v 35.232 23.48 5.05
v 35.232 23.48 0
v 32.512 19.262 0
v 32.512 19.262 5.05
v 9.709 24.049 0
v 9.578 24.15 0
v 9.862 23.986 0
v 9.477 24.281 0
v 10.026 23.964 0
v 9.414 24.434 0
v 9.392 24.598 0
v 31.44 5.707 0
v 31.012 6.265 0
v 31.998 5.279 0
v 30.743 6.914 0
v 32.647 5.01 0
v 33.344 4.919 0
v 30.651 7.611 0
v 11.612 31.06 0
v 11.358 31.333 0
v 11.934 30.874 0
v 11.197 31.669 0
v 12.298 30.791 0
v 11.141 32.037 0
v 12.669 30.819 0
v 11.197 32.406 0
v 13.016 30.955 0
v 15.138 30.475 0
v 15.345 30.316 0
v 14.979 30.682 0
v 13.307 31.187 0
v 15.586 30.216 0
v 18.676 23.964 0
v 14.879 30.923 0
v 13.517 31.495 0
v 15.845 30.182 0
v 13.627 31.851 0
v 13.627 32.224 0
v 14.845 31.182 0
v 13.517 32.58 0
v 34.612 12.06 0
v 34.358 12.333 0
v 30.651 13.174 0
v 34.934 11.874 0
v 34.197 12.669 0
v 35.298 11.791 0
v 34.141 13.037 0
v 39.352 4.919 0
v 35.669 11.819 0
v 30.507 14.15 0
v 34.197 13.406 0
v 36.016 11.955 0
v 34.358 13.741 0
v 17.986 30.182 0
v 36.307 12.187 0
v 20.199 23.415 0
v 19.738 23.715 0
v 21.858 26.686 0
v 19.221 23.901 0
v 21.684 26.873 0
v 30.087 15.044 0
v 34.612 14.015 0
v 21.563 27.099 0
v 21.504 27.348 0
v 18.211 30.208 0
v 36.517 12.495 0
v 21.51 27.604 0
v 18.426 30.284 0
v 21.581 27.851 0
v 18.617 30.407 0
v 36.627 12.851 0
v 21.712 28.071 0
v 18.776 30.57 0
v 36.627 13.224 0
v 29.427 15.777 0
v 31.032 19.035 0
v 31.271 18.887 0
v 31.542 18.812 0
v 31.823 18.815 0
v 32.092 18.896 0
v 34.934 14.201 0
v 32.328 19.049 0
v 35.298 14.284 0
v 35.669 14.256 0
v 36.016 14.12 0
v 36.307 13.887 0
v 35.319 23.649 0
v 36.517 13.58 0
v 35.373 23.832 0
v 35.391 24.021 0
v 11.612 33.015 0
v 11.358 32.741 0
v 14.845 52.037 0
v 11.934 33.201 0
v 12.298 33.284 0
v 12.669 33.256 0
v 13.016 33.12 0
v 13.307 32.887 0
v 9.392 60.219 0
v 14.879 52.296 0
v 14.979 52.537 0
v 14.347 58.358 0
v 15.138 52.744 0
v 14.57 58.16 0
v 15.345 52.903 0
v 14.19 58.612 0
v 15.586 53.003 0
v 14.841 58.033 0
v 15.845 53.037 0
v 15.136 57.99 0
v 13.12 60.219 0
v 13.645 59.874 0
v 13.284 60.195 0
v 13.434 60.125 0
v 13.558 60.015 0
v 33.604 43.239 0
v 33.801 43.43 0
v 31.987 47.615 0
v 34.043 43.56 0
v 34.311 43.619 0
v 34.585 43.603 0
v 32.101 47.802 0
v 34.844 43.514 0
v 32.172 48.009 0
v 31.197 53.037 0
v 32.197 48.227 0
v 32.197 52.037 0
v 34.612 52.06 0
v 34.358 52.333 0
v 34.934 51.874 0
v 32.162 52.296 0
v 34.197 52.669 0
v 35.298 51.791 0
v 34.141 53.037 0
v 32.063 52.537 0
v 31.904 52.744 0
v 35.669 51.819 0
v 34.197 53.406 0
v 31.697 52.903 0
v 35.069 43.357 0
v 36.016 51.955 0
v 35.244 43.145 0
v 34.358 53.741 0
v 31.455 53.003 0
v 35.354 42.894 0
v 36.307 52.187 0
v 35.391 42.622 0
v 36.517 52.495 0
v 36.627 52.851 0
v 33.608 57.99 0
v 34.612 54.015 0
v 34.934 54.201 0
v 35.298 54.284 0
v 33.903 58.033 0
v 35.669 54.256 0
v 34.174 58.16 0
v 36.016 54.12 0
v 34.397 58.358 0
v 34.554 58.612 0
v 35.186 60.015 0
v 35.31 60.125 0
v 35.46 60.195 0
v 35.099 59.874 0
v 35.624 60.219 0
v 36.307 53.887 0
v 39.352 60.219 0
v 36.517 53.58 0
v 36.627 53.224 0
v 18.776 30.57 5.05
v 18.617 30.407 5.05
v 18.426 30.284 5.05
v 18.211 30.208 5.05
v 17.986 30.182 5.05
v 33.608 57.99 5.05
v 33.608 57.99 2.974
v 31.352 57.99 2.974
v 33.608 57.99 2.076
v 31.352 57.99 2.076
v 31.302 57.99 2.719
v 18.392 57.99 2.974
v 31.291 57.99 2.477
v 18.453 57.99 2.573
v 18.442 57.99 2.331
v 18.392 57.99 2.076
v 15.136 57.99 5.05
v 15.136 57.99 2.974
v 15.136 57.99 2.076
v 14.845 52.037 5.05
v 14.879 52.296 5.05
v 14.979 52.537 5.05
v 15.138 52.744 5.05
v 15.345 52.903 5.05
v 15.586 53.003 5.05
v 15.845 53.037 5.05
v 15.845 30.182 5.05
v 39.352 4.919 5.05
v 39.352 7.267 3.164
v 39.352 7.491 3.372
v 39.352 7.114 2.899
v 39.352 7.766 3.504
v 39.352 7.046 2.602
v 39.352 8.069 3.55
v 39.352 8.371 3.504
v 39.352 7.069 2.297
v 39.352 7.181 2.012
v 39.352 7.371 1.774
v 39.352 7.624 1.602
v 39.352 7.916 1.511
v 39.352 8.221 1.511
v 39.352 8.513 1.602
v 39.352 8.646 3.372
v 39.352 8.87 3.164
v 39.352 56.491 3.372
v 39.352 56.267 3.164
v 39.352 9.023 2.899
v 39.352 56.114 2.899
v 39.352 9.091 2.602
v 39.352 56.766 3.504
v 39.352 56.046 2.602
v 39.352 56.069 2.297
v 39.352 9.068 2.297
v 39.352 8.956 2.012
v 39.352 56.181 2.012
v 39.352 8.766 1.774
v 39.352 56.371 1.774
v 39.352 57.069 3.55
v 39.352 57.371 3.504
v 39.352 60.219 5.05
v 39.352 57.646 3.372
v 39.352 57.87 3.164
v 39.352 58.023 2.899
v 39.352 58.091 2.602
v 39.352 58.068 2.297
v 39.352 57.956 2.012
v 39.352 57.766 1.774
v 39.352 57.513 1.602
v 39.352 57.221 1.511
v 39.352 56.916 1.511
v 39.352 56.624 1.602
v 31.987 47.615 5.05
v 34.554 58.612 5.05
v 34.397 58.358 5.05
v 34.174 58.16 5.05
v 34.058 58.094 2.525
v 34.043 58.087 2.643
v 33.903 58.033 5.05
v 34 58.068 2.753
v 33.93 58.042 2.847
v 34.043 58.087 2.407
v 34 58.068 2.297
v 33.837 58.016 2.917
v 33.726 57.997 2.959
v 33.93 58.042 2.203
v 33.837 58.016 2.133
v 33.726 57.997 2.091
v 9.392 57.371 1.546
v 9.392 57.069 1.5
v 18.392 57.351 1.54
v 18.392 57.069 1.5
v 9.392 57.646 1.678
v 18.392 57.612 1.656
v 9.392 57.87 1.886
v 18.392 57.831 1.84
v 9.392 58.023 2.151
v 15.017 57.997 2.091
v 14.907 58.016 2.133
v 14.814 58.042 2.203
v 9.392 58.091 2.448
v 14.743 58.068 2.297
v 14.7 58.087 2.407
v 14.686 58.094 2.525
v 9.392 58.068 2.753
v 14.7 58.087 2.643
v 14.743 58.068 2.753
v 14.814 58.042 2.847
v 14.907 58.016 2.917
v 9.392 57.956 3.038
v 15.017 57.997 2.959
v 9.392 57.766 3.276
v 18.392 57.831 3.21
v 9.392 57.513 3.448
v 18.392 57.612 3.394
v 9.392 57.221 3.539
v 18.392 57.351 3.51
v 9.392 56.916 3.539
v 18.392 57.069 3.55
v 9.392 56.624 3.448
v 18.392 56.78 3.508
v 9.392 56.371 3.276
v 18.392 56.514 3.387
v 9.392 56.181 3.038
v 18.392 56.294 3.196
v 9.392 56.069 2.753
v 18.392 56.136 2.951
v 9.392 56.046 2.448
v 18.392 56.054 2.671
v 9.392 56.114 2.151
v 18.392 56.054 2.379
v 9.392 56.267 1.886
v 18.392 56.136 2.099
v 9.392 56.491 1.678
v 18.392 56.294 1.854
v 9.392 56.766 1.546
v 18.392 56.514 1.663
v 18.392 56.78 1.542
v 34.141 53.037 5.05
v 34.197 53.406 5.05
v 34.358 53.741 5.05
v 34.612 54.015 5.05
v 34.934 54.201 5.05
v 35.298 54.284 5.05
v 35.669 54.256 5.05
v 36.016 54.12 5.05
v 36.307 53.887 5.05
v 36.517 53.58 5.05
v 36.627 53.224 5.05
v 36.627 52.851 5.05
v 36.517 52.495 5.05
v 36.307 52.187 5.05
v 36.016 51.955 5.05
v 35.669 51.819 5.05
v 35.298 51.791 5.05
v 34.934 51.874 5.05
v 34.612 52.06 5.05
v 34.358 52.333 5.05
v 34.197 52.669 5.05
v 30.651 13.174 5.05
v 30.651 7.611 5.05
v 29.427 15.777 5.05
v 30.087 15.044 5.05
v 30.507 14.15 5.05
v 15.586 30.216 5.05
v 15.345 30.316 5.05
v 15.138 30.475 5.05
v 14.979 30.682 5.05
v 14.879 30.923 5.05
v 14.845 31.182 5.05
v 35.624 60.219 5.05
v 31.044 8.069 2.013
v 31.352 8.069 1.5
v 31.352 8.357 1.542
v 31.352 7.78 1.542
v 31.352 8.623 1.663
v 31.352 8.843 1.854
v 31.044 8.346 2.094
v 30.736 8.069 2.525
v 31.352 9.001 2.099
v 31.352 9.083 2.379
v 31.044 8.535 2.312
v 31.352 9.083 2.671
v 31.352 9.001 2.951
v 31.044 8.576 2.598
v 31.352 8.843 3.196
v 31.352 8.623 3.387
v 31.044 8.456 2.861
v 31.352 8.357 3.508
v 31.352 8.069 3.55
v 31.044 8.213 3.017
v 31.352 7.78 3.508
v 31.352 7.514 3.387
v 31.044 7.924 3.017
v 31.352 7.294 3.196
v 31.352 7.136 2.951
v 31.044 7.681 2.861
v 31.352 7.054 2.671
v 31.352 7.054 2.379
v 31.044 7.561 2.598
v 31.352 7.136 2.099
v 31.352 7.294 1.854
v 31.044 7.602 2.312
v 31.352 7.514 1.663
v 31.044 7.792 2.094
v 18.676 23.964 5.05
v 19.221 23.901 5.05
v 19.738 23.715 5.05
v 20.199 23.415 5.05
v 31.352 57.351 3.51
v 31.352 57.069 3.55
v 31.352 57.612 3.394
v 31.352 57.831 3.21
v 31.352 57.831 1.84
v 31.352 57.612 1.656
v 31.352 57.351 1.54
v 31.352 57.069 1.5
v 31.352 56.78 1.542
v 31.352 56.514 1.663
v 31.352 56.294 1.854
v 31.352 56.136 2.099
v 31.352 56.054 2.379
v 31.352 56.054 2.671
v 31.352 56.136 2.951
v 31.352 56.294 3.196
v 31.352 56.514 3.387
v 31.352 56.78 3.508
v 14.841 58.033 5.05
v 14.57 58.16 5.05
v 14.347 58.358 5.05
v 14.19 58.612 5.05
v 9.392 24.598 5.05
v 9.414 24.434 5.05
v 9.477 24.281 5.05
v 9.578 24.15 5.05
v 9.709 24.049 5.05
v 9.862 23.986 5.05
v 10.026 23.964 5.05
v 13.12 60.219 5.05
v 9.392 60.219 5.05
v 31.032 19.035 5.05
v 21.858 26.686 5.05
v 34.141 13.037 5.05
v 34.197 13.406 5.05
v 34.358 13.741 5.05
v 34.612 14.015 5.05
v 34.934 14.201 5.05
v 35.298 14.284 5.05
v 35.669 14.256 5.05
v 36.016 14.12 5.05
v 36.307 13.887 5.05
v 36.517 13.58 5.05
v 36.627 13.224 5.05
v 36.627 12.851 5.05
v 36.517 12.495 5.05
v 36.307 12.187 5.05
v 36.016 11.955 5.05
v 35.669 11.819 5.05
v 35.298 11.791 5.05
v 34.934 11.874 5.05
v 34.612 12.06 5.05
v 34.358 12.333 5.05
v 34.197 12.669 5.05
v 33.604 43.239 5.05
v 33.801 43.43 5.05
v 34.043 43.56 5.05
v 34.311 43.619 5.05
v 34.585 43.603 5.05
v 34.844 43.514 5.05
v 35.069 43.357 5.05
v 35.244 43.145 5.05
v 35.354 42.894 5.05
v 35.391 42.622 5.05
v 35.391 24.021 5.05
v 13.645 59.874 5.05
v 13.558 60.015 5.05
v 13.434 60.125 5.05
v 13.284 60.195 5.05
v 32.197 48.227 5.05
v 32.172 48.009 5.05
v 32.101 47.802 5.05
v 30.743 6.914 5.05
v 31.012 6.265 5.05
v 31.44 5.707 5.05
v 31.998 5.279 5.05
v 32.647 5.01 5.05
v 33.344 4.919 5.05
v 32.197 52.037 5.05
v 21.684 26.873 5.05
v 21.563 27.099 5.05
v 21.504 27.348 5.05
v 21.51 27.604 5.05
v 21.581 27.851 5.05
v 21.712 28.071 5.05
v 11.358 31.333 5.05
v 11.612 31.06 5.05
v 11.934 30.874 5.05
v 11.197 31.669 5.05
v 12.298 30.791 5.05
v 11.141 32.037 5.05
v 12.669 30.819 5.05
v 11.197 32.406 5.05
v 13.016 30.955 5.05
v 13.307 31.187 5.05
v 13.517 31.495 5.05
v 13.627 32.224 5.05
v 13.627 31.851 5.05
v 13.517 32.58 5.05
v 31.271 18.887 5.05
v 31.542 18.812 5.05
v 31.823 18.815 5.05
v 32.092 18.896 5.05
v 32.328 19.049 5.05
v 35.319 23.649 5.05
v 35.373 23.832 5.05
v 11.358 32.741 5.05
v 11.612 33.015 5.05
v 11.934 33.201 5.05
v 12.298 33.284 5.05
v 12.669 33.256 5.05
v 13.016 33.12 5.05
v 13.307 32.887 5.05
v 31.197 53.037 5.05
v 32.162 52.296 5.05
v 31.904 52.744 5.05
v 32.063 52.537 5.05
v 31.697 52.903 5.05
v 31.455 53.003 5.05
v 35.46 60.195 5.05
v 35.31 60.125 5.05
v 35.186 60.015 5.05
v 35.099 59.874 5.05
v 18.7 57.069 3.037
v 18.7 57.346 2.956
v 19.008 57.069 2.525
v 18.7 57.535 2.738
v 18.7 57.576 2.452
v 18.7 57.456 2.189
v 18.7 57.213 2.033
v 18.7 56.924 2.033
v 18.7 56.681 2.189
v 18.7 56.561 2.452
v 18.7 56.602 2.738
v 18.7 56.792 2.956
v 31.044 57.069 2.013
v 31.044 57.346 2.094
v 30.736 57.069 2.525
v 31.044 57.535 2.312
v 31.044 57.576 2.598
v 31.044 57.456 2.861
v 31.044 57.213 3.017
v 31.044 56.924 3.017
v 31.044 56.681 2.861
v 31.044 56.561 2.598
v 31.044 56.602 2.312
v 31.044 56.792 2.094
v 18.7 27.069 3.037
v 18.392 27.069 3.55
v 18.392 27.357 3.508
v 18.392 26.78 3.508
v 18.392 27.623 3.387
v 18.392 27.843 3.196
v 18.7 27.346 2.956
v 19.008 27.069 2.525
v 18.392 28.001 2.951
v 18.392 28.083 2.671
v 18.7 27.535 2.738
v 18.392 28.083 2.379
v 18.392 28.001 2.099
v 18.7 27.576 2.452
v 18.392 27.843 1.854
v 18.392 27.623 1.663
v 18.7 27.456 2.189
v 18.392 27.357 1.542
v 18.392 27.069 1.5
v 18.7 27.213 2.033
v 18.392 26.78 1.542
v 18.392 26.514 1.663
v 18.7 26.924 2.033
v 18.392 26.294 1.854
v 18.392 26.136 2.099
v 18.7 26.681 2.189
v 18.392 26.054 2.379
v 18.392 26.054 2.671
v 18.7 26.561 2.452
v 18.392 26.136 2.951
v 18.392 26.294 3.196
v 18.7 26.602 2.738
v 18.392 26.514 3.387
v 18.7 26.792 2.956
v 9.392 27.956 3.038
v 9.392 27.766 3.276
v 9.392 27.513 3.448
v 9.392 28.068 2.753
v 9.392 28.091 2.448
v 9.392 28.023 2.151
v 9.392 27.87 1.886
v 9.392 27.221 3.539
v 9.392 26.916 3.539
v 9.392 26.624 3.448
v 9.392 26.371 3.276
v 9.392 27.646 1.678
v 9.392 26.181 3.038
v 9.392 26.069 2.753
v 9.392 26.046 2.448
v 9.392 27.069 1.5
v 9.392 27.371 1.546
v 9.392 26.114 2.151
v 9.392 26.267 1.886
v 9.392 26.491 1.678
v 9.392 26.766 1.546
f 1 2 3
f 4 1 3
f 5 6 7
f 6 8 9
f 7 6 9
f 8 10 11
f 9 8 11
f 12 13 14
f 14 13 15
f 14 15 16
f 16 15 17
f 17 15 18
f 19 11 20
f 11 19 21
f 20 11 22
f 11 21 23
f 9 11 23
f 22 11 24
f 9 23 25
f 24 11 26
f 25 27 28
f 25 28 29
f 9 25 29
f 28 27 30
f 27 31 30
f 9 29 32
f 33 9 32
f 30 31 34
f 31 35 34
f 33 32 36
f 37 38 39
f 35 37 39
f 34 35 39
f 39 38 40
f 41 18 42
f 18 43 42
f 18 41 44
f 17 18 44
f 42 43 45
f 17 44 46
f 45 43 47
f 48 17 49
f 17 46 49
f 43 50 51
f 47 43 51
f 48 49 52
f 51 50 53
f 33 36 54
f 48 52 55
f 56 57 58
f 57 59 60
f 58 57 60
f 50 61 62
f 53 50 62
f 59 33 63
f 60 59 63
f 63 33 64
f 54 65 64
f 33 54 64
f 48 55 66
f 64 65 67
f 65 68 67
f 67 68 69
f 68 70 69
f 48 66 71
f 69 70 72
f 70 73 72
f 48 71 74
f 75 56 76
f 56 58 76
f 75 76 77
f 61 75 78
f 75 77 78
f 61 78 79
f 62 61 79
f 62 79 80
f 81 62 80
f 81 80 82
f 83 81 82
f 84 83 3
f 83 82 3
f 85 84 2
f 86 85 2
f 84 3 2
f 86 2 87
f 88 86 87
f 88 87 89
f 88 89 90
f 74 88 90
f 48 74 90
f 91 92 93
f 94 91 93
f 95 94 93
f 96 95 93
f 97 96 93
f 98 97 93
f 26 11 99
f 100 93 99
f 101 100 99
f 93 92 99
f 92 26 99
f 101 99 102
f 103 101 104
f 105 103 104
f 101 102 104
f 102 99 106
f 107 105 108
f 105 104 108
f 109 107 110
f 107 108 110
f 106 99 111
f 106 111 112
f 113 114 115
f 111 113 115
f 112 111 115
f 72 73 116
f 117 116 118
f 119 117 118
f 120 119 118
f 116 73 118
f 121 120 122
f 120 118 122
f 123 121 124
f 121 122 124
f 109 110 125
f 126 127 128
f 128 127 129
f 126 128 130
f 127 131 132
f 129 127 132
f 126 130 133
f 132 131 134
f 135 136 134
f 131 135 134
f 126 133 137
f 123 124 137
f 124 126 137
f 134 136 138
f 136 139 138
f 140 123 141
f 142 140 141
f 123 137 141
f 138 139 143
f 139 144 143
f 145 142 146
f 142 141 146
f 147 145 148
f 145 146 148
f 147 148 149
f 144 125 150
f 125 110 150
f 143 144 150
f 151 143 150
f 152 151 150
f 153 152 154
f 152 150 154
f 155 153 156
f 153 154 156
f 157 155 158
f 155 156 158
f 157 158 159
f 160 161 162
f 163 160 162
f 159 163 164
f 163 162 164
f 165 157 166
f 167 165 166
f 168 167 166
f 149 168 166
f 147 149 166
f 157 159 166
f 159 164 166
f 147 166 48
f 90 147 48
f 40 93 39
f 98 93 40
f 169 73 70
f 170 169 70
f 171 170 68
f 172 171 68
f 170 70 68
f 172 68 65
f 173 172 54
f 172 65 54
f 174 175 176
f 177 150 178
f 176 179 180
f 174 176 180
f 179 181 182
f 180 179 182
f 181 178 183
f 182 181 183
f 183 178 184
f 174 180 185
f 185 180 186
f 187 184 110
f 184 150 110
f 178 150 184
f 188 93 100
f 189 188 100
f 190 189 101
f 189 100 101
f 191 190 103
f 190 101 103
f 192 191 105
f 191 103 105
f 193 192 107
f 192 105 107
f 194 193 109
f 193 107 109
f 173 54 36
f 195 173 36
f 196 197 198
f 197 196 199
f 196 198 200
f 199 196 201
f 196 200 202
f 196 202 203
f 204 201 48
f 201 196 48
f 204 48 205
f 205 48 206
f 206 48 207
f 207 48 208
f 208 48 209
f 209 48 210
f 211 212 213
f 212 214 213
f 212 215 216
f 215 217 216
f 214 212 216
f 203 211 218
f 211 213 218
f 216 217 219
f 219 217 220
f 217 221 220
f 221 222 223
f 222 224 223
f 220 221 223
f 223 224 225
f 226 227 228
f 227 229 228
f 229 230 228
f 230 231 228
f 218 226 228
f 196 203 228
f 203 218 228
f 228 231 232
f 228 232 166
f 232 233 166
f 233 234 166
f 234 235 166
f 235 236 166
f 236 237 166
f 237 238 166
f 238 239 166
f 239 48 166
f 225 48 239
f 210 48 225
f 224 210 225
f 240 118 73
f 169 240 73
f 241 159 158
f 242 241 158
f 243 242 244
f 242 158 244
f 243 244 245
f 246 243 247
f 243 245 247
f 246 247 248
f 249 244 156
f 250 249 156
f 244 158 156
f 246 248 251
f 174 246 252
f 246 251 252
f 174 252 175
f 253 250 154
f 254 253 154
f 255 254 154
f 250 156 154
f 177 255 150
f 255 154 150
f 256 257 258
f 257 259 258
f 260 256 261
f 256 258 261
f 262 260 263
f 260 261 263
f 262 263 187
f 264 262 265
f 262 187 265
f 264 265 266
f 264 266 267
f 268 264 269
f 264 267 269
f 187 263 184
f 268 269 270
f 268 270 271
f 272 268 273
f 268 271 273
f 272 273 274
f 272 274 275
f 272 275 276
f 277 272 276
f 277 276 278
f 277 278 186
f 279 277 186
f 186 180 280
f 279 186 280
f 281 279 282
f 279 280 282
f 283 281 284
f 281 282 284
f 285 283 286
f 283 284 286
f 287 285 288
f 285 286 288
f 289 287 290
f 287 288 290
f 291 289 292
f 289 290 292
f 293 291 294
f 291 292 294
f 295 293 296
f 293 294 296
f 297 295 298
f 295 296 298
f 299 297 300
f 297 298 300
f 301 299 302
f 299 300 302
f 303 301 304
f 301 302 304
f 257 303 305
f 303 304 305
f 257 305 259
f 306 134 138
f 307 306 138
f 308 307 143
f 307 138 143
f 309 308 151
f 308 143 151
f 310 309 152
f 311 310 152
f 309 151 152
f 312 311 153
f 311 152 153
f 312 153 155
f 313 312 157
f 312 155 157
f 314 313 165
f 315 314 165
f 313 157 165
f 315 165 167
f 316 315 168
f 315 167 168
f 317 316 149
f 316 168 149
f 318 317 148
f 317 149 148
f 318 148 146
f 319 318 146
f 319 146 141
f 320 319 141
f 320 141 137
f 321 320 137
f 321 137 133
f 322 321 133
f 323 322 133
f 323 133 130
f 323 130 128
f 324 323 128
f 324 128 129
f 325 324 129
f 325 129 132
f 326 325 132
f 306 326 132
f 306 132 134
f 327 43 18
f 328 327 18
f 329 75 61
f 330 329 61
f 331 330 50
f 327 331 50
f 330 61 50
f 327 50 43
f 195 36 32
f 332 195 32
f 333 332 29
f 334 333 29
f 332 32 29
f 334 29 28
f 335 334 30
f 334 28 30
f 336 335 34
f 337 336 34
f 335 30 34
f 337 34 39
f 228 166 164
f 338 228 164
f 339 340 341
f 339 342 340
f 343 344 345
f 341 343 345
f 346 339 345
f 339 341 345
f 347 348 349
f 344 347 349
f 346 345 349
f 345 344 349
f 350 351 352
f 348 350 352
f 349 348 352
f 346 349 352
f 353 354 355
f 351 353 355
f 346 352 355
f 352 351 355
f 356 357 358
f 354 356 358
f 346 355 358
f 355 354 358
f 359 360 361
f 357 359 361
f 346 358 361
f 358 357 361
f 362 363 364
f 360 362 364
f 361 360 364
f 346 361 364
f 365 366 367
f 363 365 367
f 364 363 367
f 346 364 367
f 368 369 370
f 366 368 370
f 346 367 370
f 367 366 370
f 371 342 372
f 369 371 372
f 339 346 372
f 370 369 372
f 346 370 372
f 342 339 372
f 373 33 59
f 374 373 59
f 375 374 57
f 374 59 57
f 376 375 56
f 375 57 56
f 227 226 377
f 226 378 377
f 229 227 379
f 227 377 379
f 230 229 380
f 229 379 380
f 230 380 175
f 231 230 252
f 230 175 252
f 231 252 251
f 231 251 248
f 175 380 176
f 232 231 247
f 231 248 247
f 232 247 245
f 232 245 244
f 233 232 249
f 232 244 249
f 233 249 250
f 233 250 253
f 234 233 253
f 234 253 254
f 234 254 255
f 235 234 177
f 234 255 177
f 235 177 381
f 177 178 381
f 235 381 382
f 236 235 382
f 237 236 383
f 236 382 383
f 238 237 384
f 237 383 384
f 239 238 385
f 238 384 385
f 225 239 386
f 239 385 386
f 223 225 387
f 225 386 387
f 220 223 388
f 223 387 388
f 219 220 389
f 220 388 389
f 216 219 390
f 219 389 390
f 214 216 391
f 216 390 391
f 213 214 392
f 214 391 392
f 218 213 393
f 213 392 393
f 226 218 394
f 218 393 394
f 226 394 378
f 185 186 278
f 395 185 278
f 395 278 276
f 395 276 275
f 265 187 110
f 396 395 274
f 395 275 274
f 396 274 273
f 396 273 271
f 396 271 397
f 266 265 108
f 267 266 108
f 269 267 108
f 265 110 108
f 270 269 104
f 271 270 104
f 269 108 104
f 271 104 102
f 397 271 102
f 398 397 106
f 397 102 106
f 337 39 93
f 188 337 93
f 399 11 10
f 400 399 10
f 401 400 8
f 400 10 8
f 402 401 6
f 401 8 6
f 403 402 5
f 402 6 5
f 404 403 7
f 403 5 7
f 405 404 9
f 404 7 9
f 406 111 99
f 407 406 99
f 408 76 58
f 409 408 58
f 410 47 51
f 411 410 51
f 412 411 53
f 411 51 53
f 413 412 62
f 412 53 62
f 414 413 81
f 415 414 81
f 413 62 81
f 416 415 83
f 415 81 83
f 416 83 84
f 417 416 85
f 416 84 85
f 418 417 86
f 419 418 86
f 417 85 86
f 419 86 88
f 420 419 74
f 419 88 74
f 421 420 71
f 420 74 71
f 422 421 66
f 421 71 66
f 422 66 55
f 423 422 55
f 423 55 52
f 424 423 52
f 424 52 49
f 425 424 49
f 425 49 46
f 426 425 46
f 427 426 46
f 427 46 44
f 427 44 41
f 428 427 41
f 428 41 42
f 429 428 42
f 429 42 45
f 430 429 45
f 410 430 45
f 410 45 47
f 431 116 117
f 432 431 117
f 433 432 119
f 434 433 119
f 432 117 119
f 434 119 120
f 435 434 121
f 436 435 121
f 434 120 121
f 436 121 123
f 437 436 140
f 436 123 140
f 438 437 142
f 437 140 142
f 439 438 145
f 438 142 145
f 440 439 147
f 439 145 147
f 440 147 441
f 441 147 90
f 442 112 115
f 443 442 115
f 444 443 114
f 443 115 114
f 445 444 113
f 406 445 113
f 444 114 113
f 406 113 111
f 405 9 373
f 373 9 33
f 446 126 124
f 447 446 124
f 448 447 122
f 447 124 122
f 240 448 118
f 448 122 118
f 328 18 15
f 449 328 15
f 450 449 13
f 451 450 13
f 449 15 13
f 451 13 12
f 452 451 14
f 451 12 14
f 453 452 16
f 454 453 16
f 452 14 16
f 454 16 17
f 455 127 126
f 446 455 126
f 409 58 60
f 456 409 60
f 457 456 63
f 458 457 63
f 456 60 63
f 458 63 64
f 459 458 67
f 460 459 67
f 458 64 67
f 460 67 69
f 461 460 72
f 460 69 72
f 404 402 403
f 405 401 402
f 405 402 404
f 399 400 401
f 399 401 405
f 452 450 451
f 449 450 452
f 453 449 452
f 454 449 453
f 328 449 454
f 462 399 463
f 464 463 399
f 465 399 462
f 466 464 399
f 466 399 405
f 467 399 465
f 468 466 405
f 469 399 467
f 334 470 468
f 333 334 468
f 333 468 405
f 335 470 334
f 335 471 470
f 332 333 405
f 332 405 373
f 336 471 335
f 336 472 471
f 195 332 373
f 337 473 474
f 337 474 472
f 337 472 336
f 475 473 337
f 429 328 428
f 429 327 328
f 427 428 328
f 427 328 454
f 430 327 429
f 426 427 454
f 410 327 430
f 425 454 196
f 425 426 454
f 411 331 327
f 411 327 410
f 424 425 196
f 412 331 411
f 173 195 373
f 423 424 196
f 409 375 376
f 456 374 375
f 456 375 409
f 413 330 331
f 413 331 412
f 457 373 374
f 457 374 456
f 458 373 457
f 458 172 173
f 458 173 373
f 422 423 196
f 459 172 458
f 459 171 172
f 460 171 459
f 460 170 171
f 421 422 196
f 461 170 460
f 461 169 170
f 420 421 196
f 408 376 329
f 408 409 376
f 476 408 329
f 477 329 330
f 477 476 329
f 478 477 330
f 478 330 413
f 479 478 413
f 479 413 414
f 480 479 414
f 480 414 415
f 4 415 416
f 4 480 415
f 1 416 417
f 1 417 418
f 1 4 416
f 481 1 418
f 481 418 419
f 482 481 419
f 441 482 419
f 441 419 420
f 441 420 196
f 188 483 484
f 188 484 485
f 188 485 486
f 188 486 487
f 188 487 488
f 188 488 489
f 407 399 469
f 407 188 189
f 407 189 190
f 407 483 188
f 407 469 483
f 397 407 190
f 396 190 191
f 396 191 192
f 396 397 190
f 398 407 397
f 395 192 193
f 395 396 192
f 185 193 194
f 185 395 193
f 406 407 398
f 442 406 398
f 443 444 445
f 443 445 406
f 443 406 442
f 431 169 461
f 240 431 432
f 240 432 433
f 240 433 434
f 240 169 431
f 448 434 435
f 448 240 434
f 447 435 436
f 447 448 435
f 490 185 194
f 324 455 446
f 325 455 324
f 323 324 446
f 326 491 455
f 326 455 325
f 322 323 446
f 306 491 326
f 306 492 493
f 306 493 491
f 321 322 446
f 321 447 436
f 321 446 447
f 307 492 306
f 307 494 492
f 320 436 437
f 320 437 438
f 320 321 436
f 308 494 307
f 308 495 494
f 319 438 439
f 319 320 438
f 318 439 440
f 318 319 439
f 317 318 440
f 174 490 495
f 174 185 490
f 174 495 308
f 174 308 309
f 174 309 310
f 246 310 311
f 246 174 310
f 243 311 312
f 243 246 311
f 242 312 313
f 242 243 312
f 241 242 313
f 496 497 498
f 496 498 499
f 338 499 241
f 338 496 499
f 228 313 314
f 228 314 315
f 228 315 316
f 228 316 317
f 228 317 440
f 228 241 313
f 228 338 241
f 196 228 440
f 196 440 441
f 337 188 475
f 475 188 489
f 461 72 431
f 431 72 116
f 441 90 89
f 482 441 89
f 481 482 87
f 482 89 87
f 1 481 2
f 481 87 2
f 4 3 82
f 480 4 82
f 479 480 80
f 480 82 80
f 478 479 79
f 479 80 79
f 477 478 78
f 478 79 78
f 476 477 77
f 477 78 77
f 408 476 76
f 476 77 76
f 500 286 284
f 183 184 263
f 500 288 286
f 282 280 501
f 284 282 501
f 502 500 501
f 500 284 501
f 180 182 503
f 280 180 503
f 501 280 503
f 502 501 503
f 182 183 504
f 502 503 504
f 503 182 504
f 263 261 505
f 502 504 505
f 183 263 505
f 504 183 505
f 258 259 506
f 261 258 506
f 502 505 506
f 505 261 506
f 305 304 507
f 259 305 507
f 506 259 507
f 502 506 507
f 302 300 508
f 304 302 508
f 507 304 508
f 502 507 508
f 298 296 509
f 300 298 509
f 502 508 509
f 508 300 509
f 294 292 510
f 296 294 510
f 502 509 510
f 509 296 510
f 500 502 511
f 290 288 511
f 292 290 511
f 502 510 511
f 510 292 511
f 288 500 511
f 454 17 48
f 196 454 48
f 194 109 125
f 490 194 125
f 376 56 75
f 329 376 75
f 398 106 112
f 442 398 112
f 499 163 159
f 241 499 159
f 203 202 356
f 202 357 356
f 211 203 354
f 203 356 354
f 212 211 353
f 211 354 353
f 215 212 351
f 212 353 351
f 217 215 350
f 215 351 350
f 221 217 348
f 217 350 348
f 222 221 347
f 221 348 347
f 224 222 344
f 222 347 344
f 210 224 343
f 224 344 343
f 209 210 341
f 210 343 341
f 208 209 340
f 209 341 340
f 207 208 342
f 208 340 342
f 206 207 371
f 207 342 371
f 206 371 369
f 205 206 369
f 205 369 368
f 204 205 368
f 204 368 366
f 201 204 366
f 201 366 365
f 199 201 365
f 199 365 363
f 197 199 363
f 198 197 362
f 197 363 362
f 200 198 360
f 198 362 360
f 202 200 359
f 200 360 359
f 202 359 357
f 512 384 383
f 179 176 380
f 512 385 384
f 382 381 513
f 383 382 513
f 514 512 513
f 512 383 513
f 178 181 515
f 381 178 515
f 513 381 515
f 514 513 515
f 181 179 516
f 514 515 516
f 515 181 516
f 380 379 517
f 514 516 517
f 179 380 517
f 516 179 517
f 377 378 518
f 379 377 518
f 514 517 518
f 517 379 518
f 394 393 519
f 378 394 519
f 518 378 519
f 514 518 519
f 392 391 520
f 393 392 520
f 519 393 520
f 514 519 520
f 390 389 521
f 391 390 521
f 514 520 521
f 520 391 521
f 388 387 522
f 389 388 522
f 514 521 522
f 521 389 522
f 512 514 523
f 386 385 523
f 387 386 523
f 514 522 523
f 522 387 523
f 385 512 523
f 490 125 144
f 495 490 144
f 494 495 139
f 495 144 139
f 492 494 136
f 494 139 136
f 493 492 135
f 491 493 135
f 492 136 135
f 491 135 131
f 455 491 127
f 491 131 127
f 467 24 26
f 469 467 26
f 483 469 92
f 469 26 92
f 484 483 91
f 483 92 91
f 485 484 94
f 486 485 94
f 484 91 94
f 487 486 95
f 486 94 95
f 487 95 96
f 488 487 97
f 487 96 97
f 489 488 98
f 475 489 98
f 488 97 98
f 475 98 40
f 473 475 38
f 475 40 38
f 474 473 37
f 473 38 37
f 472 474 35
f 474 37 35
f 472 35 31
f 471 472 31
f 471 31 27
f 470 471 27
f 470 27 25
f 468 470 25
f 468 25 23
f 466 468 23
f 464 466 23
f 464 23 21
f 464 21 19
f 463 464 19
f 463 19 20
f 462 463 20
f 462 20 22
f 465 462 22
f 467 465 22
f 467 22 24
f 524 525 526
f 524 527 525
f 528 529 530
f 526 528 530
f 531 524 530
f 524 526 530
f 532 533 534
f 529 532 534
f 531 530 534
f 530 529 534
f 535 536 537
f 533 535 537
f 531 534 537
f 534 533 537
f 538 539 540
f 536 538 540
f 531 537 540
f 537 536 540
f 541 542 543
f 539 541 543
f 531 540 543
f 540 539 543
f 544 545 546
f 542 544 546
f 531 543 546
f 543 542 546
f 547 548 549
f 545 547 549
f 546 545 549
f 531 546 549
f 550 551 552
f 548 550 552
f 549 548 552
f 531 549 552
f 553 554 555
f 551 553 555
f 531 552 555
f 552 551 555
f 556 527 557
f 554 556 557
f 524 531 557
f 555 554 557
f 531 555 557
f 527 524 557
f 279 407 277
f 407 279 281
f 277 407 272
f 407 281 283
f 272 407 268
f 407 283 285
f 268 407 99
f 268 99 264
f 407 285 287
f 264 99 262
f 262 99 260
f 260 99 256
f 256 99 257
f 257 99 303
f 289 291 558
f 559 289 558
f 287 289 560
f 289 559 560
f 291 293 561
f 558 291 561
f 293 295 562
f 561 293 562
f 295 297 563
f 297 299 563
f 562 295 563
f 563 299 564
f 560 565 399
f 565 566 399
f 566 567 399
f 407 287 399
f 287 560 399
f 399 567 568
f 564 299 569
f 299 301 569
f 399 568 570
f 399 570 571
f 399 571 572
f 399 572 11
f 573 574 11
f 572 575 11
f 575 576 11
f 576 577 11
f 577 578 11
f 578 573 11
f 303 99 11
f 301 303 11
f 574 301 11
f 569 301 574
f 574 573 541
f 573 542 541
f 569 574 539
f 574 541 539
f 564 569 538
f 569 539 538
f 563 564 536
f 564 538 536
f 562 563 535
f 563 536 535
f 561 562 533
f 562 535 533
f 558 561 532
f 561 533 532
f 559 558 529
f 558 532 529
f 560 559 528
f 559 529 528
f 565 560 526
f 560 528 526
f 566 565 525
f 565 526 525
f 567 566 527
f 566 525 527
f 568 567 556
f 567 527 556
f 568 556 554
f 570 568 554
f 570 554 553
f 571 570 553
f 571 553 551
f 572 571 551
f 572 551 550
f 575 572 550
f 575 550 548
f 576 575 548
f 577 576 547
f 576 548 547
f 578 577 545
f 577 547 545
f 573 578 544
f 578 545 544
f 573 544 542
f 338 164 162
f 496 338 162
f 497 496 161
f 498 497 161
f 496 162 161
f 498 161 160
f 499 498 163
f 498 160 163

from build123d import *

# Parameters (mm, degrees)
ESTRUSIONE_ESTRUSIONE1_DEPTH     = 5.05
FORO_FILETTATO_M3X0_5_1_D        = 2.5
FORO_FILETTATO_M2_5X0_45_1_D     = 2.05
FORO_FILETTATO_M2_5X0_45_1_DEPTH = 8
FORO_FILETTATO_M2_5X0_45_1_TIP   = 0.615882135
FORO_FILETTATO_M2_5X0_45_2_D     = 2.05
FORO_FILETTATO_M2_5X0_45_2_DEPTH = 9
FORO_FILETTATO_M2_5X0_45_2_TIP   = 0.615882135


with BuildPart() as part:
    # Schizzo1 → Estrusione-Estrusione1 (new body)
    with BuildSketch(Plane.XY):
        with BuildLine():
            Line((33.607852656, 57.990136231), (15.135967017, 57.990136231))
            ThreePointArc((15.135967017, 57.990136231), (14.569863255, 58.159527321), (14.189841424, 58.612020655))
            Line((14.189841424, 58.612020655), (13.644681905, 59.873833883))
            ThreePointArc((13.644681905, 59.873833883), (13.434009359, 60.124682426), (13.12017865, 60.218587695))
            Line((13.12017865, 60.218587695), (9.391909837, 60.218587695))
            Line((9.391909837, 60.218587695), (9.391909837, 24.597853141))
            ThreePointArc((9.391909837, 24.597853141), (9.577563808, 24.149644804), (10.025772145, 23.963990832))
            Line((10.025772145, 23.963990832), (18.675714063, 23.963990832))
            ThreePointArc((18.675714063, 23.963990832), (19.485298036, 23.822640523), (20.199085336, 23.415315332))
            Line((20.199085336, 23.415315332), (29.426699127, 15.777448227))
            ThreePointArc((29.426699127, 15.777448227), (30.330003033, 14.612437653), (30.65149016, 13.173739071))
            Line((30.65149016, 13.173739071), (30.65149016, 7.610644322))
            ThreePointArc((30.65149016, 7.610644322), (31.43997529, 5.707072826), (33.343546787, 4.918587695))
            Line((33.343546787, 4.918587695), (39.351909837, 4.918587695))
            Line((39.351909837, 4.918587695), (39.351909837, 60.218587695))
            Line((39.351909837, 60.218587695), (35.623641023, 60.218587695))
            ThreePointArc((35.623641023, 60.218587695), (35.309810314, 60.124682426), (35.099137768, 59.873833883))
            Line((35.099137768, 59.873833883), (34.553978249, 58.612020655))
            ThreePointArc((34.553978249, 58.612020655), (34.173956418, 58.159527321), (33.607852656, 57.990136231))
        make_face()
        with BuildLine():
            Line((31.031517622, 19.035447222), (21.858166203, 26.68561737))
            ThreePointArc((21.858166203, 26.68561737), (21.50418026, 27.348416385), (21.711670705, 28.070604932))
            Line((21.711670705, 28.070604932), (33.604209018, 43.239087362))
            ThreePointArc((33.604209018, 43.239087362), (34.717543506, 43.567327143), (35.391171024, 42.622085902))
            Line((35.391171024, 42.622085902), (35.391171024, 24.021384648))
            ThreePointArc((35.391171024, 24.021384648), (35.35046365, 23.738970664), (35.231655708, 23.479549344))
            Line((35.231655708, 23.479549344), (32.512468814, 19.26159802))
            ThreePointArc((32.512468814, 19.26159802), (31.822940625, 18.814892917), (31.031517622, 19.035447222))
        make_face(mode=Mode.SUBTRACT)
        with BuildLine():
            Line((15.844806521, 53.037240639), (31.196511098, 53.037240639))
            ThreePointArc((31.196511098, 53.037240639), (31.90361788, 52.74434742), (32.196511098, 52.037240639))
            Line((32.196511098, 52.037240639), (32.196511098, 48.227218639))
            ThreePointArc((32.196511098, 48.227218639), (32.142658979, 47.90348389), (31.986902723, 47.614616745))
            Line((31.986902723, 47.614616745), (18.775971342, 30.569600026))
            ThreePointArc((18.775971342, 30.569600026), (18.425692263, 30.284259301), (17.985579717, 30.182201919))
            Line((17.985579717, 30.182201919), (15.844806521, 30.182201919))
            ThreePointArc((15.844806521, 30.182201919), (15.13769974, 30.475095138), (14.844806521, 31.182201919))
            Line((14.844806521, 31.182201919), (14.844806521, 52.037240639))
            ThreePointArc((14.844806521, 52.037240639), (15.13769974, 52.74434742), (15.844806521, 53.037240639))
        make_face(mode=Mode.SUBTRACT)
    extrude(amount=ESTRUSIONE_ESTRUSIONE1_DEPTH)

    # Foro filettato M3x0.5-1 (through all)
    with Locations(Plane.XY.offset(5.05)):
        with Locations((35.391171024, 53.037240639), (12.391171024, 32.037240639), (35.391171024, 13.037240639)):
            Hole(FORO_FILETTATO_M3X0_5_1_D / 2)

    # Foro filettato M2.5x0.45-1
    with Locations(Plane(origin=(39.351909837, 0, 0), x_dir=(0, 0, -1), z_dir=(1, 0, 0))):
        with Locations((-2.525, 57.068587695), (-2.525, 8.068587695)):
            Hole(FORO_FILETTATO_M2_5X0_45_1_D / 2, depth=FORO_FILETTATO_M2_5X0_45_1_DEPTH)
            with Locations((0, 0, -(FORO_FILETTATO_M2_5X0_45_1_DEPTH + FORO_FILETTATO_M2_5X0_45_1_TIP / 2))):  # 118° drill point
                Cone(0, FORO_FILETTATO_M2_5X0_45_1_D / 2, FORO_FILETTATO_M2_5X0_45_1_TIP, mode=Mode.SUBTRACT)

    # Foro filettato M2.5x0.45-2
    with Locations(Plane.ZY.offset(-9.391909837)):
        with Locations((2.525, 57.068587695), (2.525, 27.068587695)):
            Hole(FORO_FILETTATO_M2_5X0_45_2_D / 2, depth=FORO_FILETTATO_M2_5X0_45_2_DEPTH)
            with Locations((0, 0, -(FORO_FILETTATO_M2_5X0_45_2_DEPTH + FORO_FILETTATO_M2_5X0_45_2_TIP / 2))):  # 118° drill point
                Cone(0, FORO_FILETTATO_M2_5X0_45_2_D / 2, FORO_FILETTATO_M2_5X0_45_2_TIP, mode=Mode.SUBTRACT)


solid = part.part
